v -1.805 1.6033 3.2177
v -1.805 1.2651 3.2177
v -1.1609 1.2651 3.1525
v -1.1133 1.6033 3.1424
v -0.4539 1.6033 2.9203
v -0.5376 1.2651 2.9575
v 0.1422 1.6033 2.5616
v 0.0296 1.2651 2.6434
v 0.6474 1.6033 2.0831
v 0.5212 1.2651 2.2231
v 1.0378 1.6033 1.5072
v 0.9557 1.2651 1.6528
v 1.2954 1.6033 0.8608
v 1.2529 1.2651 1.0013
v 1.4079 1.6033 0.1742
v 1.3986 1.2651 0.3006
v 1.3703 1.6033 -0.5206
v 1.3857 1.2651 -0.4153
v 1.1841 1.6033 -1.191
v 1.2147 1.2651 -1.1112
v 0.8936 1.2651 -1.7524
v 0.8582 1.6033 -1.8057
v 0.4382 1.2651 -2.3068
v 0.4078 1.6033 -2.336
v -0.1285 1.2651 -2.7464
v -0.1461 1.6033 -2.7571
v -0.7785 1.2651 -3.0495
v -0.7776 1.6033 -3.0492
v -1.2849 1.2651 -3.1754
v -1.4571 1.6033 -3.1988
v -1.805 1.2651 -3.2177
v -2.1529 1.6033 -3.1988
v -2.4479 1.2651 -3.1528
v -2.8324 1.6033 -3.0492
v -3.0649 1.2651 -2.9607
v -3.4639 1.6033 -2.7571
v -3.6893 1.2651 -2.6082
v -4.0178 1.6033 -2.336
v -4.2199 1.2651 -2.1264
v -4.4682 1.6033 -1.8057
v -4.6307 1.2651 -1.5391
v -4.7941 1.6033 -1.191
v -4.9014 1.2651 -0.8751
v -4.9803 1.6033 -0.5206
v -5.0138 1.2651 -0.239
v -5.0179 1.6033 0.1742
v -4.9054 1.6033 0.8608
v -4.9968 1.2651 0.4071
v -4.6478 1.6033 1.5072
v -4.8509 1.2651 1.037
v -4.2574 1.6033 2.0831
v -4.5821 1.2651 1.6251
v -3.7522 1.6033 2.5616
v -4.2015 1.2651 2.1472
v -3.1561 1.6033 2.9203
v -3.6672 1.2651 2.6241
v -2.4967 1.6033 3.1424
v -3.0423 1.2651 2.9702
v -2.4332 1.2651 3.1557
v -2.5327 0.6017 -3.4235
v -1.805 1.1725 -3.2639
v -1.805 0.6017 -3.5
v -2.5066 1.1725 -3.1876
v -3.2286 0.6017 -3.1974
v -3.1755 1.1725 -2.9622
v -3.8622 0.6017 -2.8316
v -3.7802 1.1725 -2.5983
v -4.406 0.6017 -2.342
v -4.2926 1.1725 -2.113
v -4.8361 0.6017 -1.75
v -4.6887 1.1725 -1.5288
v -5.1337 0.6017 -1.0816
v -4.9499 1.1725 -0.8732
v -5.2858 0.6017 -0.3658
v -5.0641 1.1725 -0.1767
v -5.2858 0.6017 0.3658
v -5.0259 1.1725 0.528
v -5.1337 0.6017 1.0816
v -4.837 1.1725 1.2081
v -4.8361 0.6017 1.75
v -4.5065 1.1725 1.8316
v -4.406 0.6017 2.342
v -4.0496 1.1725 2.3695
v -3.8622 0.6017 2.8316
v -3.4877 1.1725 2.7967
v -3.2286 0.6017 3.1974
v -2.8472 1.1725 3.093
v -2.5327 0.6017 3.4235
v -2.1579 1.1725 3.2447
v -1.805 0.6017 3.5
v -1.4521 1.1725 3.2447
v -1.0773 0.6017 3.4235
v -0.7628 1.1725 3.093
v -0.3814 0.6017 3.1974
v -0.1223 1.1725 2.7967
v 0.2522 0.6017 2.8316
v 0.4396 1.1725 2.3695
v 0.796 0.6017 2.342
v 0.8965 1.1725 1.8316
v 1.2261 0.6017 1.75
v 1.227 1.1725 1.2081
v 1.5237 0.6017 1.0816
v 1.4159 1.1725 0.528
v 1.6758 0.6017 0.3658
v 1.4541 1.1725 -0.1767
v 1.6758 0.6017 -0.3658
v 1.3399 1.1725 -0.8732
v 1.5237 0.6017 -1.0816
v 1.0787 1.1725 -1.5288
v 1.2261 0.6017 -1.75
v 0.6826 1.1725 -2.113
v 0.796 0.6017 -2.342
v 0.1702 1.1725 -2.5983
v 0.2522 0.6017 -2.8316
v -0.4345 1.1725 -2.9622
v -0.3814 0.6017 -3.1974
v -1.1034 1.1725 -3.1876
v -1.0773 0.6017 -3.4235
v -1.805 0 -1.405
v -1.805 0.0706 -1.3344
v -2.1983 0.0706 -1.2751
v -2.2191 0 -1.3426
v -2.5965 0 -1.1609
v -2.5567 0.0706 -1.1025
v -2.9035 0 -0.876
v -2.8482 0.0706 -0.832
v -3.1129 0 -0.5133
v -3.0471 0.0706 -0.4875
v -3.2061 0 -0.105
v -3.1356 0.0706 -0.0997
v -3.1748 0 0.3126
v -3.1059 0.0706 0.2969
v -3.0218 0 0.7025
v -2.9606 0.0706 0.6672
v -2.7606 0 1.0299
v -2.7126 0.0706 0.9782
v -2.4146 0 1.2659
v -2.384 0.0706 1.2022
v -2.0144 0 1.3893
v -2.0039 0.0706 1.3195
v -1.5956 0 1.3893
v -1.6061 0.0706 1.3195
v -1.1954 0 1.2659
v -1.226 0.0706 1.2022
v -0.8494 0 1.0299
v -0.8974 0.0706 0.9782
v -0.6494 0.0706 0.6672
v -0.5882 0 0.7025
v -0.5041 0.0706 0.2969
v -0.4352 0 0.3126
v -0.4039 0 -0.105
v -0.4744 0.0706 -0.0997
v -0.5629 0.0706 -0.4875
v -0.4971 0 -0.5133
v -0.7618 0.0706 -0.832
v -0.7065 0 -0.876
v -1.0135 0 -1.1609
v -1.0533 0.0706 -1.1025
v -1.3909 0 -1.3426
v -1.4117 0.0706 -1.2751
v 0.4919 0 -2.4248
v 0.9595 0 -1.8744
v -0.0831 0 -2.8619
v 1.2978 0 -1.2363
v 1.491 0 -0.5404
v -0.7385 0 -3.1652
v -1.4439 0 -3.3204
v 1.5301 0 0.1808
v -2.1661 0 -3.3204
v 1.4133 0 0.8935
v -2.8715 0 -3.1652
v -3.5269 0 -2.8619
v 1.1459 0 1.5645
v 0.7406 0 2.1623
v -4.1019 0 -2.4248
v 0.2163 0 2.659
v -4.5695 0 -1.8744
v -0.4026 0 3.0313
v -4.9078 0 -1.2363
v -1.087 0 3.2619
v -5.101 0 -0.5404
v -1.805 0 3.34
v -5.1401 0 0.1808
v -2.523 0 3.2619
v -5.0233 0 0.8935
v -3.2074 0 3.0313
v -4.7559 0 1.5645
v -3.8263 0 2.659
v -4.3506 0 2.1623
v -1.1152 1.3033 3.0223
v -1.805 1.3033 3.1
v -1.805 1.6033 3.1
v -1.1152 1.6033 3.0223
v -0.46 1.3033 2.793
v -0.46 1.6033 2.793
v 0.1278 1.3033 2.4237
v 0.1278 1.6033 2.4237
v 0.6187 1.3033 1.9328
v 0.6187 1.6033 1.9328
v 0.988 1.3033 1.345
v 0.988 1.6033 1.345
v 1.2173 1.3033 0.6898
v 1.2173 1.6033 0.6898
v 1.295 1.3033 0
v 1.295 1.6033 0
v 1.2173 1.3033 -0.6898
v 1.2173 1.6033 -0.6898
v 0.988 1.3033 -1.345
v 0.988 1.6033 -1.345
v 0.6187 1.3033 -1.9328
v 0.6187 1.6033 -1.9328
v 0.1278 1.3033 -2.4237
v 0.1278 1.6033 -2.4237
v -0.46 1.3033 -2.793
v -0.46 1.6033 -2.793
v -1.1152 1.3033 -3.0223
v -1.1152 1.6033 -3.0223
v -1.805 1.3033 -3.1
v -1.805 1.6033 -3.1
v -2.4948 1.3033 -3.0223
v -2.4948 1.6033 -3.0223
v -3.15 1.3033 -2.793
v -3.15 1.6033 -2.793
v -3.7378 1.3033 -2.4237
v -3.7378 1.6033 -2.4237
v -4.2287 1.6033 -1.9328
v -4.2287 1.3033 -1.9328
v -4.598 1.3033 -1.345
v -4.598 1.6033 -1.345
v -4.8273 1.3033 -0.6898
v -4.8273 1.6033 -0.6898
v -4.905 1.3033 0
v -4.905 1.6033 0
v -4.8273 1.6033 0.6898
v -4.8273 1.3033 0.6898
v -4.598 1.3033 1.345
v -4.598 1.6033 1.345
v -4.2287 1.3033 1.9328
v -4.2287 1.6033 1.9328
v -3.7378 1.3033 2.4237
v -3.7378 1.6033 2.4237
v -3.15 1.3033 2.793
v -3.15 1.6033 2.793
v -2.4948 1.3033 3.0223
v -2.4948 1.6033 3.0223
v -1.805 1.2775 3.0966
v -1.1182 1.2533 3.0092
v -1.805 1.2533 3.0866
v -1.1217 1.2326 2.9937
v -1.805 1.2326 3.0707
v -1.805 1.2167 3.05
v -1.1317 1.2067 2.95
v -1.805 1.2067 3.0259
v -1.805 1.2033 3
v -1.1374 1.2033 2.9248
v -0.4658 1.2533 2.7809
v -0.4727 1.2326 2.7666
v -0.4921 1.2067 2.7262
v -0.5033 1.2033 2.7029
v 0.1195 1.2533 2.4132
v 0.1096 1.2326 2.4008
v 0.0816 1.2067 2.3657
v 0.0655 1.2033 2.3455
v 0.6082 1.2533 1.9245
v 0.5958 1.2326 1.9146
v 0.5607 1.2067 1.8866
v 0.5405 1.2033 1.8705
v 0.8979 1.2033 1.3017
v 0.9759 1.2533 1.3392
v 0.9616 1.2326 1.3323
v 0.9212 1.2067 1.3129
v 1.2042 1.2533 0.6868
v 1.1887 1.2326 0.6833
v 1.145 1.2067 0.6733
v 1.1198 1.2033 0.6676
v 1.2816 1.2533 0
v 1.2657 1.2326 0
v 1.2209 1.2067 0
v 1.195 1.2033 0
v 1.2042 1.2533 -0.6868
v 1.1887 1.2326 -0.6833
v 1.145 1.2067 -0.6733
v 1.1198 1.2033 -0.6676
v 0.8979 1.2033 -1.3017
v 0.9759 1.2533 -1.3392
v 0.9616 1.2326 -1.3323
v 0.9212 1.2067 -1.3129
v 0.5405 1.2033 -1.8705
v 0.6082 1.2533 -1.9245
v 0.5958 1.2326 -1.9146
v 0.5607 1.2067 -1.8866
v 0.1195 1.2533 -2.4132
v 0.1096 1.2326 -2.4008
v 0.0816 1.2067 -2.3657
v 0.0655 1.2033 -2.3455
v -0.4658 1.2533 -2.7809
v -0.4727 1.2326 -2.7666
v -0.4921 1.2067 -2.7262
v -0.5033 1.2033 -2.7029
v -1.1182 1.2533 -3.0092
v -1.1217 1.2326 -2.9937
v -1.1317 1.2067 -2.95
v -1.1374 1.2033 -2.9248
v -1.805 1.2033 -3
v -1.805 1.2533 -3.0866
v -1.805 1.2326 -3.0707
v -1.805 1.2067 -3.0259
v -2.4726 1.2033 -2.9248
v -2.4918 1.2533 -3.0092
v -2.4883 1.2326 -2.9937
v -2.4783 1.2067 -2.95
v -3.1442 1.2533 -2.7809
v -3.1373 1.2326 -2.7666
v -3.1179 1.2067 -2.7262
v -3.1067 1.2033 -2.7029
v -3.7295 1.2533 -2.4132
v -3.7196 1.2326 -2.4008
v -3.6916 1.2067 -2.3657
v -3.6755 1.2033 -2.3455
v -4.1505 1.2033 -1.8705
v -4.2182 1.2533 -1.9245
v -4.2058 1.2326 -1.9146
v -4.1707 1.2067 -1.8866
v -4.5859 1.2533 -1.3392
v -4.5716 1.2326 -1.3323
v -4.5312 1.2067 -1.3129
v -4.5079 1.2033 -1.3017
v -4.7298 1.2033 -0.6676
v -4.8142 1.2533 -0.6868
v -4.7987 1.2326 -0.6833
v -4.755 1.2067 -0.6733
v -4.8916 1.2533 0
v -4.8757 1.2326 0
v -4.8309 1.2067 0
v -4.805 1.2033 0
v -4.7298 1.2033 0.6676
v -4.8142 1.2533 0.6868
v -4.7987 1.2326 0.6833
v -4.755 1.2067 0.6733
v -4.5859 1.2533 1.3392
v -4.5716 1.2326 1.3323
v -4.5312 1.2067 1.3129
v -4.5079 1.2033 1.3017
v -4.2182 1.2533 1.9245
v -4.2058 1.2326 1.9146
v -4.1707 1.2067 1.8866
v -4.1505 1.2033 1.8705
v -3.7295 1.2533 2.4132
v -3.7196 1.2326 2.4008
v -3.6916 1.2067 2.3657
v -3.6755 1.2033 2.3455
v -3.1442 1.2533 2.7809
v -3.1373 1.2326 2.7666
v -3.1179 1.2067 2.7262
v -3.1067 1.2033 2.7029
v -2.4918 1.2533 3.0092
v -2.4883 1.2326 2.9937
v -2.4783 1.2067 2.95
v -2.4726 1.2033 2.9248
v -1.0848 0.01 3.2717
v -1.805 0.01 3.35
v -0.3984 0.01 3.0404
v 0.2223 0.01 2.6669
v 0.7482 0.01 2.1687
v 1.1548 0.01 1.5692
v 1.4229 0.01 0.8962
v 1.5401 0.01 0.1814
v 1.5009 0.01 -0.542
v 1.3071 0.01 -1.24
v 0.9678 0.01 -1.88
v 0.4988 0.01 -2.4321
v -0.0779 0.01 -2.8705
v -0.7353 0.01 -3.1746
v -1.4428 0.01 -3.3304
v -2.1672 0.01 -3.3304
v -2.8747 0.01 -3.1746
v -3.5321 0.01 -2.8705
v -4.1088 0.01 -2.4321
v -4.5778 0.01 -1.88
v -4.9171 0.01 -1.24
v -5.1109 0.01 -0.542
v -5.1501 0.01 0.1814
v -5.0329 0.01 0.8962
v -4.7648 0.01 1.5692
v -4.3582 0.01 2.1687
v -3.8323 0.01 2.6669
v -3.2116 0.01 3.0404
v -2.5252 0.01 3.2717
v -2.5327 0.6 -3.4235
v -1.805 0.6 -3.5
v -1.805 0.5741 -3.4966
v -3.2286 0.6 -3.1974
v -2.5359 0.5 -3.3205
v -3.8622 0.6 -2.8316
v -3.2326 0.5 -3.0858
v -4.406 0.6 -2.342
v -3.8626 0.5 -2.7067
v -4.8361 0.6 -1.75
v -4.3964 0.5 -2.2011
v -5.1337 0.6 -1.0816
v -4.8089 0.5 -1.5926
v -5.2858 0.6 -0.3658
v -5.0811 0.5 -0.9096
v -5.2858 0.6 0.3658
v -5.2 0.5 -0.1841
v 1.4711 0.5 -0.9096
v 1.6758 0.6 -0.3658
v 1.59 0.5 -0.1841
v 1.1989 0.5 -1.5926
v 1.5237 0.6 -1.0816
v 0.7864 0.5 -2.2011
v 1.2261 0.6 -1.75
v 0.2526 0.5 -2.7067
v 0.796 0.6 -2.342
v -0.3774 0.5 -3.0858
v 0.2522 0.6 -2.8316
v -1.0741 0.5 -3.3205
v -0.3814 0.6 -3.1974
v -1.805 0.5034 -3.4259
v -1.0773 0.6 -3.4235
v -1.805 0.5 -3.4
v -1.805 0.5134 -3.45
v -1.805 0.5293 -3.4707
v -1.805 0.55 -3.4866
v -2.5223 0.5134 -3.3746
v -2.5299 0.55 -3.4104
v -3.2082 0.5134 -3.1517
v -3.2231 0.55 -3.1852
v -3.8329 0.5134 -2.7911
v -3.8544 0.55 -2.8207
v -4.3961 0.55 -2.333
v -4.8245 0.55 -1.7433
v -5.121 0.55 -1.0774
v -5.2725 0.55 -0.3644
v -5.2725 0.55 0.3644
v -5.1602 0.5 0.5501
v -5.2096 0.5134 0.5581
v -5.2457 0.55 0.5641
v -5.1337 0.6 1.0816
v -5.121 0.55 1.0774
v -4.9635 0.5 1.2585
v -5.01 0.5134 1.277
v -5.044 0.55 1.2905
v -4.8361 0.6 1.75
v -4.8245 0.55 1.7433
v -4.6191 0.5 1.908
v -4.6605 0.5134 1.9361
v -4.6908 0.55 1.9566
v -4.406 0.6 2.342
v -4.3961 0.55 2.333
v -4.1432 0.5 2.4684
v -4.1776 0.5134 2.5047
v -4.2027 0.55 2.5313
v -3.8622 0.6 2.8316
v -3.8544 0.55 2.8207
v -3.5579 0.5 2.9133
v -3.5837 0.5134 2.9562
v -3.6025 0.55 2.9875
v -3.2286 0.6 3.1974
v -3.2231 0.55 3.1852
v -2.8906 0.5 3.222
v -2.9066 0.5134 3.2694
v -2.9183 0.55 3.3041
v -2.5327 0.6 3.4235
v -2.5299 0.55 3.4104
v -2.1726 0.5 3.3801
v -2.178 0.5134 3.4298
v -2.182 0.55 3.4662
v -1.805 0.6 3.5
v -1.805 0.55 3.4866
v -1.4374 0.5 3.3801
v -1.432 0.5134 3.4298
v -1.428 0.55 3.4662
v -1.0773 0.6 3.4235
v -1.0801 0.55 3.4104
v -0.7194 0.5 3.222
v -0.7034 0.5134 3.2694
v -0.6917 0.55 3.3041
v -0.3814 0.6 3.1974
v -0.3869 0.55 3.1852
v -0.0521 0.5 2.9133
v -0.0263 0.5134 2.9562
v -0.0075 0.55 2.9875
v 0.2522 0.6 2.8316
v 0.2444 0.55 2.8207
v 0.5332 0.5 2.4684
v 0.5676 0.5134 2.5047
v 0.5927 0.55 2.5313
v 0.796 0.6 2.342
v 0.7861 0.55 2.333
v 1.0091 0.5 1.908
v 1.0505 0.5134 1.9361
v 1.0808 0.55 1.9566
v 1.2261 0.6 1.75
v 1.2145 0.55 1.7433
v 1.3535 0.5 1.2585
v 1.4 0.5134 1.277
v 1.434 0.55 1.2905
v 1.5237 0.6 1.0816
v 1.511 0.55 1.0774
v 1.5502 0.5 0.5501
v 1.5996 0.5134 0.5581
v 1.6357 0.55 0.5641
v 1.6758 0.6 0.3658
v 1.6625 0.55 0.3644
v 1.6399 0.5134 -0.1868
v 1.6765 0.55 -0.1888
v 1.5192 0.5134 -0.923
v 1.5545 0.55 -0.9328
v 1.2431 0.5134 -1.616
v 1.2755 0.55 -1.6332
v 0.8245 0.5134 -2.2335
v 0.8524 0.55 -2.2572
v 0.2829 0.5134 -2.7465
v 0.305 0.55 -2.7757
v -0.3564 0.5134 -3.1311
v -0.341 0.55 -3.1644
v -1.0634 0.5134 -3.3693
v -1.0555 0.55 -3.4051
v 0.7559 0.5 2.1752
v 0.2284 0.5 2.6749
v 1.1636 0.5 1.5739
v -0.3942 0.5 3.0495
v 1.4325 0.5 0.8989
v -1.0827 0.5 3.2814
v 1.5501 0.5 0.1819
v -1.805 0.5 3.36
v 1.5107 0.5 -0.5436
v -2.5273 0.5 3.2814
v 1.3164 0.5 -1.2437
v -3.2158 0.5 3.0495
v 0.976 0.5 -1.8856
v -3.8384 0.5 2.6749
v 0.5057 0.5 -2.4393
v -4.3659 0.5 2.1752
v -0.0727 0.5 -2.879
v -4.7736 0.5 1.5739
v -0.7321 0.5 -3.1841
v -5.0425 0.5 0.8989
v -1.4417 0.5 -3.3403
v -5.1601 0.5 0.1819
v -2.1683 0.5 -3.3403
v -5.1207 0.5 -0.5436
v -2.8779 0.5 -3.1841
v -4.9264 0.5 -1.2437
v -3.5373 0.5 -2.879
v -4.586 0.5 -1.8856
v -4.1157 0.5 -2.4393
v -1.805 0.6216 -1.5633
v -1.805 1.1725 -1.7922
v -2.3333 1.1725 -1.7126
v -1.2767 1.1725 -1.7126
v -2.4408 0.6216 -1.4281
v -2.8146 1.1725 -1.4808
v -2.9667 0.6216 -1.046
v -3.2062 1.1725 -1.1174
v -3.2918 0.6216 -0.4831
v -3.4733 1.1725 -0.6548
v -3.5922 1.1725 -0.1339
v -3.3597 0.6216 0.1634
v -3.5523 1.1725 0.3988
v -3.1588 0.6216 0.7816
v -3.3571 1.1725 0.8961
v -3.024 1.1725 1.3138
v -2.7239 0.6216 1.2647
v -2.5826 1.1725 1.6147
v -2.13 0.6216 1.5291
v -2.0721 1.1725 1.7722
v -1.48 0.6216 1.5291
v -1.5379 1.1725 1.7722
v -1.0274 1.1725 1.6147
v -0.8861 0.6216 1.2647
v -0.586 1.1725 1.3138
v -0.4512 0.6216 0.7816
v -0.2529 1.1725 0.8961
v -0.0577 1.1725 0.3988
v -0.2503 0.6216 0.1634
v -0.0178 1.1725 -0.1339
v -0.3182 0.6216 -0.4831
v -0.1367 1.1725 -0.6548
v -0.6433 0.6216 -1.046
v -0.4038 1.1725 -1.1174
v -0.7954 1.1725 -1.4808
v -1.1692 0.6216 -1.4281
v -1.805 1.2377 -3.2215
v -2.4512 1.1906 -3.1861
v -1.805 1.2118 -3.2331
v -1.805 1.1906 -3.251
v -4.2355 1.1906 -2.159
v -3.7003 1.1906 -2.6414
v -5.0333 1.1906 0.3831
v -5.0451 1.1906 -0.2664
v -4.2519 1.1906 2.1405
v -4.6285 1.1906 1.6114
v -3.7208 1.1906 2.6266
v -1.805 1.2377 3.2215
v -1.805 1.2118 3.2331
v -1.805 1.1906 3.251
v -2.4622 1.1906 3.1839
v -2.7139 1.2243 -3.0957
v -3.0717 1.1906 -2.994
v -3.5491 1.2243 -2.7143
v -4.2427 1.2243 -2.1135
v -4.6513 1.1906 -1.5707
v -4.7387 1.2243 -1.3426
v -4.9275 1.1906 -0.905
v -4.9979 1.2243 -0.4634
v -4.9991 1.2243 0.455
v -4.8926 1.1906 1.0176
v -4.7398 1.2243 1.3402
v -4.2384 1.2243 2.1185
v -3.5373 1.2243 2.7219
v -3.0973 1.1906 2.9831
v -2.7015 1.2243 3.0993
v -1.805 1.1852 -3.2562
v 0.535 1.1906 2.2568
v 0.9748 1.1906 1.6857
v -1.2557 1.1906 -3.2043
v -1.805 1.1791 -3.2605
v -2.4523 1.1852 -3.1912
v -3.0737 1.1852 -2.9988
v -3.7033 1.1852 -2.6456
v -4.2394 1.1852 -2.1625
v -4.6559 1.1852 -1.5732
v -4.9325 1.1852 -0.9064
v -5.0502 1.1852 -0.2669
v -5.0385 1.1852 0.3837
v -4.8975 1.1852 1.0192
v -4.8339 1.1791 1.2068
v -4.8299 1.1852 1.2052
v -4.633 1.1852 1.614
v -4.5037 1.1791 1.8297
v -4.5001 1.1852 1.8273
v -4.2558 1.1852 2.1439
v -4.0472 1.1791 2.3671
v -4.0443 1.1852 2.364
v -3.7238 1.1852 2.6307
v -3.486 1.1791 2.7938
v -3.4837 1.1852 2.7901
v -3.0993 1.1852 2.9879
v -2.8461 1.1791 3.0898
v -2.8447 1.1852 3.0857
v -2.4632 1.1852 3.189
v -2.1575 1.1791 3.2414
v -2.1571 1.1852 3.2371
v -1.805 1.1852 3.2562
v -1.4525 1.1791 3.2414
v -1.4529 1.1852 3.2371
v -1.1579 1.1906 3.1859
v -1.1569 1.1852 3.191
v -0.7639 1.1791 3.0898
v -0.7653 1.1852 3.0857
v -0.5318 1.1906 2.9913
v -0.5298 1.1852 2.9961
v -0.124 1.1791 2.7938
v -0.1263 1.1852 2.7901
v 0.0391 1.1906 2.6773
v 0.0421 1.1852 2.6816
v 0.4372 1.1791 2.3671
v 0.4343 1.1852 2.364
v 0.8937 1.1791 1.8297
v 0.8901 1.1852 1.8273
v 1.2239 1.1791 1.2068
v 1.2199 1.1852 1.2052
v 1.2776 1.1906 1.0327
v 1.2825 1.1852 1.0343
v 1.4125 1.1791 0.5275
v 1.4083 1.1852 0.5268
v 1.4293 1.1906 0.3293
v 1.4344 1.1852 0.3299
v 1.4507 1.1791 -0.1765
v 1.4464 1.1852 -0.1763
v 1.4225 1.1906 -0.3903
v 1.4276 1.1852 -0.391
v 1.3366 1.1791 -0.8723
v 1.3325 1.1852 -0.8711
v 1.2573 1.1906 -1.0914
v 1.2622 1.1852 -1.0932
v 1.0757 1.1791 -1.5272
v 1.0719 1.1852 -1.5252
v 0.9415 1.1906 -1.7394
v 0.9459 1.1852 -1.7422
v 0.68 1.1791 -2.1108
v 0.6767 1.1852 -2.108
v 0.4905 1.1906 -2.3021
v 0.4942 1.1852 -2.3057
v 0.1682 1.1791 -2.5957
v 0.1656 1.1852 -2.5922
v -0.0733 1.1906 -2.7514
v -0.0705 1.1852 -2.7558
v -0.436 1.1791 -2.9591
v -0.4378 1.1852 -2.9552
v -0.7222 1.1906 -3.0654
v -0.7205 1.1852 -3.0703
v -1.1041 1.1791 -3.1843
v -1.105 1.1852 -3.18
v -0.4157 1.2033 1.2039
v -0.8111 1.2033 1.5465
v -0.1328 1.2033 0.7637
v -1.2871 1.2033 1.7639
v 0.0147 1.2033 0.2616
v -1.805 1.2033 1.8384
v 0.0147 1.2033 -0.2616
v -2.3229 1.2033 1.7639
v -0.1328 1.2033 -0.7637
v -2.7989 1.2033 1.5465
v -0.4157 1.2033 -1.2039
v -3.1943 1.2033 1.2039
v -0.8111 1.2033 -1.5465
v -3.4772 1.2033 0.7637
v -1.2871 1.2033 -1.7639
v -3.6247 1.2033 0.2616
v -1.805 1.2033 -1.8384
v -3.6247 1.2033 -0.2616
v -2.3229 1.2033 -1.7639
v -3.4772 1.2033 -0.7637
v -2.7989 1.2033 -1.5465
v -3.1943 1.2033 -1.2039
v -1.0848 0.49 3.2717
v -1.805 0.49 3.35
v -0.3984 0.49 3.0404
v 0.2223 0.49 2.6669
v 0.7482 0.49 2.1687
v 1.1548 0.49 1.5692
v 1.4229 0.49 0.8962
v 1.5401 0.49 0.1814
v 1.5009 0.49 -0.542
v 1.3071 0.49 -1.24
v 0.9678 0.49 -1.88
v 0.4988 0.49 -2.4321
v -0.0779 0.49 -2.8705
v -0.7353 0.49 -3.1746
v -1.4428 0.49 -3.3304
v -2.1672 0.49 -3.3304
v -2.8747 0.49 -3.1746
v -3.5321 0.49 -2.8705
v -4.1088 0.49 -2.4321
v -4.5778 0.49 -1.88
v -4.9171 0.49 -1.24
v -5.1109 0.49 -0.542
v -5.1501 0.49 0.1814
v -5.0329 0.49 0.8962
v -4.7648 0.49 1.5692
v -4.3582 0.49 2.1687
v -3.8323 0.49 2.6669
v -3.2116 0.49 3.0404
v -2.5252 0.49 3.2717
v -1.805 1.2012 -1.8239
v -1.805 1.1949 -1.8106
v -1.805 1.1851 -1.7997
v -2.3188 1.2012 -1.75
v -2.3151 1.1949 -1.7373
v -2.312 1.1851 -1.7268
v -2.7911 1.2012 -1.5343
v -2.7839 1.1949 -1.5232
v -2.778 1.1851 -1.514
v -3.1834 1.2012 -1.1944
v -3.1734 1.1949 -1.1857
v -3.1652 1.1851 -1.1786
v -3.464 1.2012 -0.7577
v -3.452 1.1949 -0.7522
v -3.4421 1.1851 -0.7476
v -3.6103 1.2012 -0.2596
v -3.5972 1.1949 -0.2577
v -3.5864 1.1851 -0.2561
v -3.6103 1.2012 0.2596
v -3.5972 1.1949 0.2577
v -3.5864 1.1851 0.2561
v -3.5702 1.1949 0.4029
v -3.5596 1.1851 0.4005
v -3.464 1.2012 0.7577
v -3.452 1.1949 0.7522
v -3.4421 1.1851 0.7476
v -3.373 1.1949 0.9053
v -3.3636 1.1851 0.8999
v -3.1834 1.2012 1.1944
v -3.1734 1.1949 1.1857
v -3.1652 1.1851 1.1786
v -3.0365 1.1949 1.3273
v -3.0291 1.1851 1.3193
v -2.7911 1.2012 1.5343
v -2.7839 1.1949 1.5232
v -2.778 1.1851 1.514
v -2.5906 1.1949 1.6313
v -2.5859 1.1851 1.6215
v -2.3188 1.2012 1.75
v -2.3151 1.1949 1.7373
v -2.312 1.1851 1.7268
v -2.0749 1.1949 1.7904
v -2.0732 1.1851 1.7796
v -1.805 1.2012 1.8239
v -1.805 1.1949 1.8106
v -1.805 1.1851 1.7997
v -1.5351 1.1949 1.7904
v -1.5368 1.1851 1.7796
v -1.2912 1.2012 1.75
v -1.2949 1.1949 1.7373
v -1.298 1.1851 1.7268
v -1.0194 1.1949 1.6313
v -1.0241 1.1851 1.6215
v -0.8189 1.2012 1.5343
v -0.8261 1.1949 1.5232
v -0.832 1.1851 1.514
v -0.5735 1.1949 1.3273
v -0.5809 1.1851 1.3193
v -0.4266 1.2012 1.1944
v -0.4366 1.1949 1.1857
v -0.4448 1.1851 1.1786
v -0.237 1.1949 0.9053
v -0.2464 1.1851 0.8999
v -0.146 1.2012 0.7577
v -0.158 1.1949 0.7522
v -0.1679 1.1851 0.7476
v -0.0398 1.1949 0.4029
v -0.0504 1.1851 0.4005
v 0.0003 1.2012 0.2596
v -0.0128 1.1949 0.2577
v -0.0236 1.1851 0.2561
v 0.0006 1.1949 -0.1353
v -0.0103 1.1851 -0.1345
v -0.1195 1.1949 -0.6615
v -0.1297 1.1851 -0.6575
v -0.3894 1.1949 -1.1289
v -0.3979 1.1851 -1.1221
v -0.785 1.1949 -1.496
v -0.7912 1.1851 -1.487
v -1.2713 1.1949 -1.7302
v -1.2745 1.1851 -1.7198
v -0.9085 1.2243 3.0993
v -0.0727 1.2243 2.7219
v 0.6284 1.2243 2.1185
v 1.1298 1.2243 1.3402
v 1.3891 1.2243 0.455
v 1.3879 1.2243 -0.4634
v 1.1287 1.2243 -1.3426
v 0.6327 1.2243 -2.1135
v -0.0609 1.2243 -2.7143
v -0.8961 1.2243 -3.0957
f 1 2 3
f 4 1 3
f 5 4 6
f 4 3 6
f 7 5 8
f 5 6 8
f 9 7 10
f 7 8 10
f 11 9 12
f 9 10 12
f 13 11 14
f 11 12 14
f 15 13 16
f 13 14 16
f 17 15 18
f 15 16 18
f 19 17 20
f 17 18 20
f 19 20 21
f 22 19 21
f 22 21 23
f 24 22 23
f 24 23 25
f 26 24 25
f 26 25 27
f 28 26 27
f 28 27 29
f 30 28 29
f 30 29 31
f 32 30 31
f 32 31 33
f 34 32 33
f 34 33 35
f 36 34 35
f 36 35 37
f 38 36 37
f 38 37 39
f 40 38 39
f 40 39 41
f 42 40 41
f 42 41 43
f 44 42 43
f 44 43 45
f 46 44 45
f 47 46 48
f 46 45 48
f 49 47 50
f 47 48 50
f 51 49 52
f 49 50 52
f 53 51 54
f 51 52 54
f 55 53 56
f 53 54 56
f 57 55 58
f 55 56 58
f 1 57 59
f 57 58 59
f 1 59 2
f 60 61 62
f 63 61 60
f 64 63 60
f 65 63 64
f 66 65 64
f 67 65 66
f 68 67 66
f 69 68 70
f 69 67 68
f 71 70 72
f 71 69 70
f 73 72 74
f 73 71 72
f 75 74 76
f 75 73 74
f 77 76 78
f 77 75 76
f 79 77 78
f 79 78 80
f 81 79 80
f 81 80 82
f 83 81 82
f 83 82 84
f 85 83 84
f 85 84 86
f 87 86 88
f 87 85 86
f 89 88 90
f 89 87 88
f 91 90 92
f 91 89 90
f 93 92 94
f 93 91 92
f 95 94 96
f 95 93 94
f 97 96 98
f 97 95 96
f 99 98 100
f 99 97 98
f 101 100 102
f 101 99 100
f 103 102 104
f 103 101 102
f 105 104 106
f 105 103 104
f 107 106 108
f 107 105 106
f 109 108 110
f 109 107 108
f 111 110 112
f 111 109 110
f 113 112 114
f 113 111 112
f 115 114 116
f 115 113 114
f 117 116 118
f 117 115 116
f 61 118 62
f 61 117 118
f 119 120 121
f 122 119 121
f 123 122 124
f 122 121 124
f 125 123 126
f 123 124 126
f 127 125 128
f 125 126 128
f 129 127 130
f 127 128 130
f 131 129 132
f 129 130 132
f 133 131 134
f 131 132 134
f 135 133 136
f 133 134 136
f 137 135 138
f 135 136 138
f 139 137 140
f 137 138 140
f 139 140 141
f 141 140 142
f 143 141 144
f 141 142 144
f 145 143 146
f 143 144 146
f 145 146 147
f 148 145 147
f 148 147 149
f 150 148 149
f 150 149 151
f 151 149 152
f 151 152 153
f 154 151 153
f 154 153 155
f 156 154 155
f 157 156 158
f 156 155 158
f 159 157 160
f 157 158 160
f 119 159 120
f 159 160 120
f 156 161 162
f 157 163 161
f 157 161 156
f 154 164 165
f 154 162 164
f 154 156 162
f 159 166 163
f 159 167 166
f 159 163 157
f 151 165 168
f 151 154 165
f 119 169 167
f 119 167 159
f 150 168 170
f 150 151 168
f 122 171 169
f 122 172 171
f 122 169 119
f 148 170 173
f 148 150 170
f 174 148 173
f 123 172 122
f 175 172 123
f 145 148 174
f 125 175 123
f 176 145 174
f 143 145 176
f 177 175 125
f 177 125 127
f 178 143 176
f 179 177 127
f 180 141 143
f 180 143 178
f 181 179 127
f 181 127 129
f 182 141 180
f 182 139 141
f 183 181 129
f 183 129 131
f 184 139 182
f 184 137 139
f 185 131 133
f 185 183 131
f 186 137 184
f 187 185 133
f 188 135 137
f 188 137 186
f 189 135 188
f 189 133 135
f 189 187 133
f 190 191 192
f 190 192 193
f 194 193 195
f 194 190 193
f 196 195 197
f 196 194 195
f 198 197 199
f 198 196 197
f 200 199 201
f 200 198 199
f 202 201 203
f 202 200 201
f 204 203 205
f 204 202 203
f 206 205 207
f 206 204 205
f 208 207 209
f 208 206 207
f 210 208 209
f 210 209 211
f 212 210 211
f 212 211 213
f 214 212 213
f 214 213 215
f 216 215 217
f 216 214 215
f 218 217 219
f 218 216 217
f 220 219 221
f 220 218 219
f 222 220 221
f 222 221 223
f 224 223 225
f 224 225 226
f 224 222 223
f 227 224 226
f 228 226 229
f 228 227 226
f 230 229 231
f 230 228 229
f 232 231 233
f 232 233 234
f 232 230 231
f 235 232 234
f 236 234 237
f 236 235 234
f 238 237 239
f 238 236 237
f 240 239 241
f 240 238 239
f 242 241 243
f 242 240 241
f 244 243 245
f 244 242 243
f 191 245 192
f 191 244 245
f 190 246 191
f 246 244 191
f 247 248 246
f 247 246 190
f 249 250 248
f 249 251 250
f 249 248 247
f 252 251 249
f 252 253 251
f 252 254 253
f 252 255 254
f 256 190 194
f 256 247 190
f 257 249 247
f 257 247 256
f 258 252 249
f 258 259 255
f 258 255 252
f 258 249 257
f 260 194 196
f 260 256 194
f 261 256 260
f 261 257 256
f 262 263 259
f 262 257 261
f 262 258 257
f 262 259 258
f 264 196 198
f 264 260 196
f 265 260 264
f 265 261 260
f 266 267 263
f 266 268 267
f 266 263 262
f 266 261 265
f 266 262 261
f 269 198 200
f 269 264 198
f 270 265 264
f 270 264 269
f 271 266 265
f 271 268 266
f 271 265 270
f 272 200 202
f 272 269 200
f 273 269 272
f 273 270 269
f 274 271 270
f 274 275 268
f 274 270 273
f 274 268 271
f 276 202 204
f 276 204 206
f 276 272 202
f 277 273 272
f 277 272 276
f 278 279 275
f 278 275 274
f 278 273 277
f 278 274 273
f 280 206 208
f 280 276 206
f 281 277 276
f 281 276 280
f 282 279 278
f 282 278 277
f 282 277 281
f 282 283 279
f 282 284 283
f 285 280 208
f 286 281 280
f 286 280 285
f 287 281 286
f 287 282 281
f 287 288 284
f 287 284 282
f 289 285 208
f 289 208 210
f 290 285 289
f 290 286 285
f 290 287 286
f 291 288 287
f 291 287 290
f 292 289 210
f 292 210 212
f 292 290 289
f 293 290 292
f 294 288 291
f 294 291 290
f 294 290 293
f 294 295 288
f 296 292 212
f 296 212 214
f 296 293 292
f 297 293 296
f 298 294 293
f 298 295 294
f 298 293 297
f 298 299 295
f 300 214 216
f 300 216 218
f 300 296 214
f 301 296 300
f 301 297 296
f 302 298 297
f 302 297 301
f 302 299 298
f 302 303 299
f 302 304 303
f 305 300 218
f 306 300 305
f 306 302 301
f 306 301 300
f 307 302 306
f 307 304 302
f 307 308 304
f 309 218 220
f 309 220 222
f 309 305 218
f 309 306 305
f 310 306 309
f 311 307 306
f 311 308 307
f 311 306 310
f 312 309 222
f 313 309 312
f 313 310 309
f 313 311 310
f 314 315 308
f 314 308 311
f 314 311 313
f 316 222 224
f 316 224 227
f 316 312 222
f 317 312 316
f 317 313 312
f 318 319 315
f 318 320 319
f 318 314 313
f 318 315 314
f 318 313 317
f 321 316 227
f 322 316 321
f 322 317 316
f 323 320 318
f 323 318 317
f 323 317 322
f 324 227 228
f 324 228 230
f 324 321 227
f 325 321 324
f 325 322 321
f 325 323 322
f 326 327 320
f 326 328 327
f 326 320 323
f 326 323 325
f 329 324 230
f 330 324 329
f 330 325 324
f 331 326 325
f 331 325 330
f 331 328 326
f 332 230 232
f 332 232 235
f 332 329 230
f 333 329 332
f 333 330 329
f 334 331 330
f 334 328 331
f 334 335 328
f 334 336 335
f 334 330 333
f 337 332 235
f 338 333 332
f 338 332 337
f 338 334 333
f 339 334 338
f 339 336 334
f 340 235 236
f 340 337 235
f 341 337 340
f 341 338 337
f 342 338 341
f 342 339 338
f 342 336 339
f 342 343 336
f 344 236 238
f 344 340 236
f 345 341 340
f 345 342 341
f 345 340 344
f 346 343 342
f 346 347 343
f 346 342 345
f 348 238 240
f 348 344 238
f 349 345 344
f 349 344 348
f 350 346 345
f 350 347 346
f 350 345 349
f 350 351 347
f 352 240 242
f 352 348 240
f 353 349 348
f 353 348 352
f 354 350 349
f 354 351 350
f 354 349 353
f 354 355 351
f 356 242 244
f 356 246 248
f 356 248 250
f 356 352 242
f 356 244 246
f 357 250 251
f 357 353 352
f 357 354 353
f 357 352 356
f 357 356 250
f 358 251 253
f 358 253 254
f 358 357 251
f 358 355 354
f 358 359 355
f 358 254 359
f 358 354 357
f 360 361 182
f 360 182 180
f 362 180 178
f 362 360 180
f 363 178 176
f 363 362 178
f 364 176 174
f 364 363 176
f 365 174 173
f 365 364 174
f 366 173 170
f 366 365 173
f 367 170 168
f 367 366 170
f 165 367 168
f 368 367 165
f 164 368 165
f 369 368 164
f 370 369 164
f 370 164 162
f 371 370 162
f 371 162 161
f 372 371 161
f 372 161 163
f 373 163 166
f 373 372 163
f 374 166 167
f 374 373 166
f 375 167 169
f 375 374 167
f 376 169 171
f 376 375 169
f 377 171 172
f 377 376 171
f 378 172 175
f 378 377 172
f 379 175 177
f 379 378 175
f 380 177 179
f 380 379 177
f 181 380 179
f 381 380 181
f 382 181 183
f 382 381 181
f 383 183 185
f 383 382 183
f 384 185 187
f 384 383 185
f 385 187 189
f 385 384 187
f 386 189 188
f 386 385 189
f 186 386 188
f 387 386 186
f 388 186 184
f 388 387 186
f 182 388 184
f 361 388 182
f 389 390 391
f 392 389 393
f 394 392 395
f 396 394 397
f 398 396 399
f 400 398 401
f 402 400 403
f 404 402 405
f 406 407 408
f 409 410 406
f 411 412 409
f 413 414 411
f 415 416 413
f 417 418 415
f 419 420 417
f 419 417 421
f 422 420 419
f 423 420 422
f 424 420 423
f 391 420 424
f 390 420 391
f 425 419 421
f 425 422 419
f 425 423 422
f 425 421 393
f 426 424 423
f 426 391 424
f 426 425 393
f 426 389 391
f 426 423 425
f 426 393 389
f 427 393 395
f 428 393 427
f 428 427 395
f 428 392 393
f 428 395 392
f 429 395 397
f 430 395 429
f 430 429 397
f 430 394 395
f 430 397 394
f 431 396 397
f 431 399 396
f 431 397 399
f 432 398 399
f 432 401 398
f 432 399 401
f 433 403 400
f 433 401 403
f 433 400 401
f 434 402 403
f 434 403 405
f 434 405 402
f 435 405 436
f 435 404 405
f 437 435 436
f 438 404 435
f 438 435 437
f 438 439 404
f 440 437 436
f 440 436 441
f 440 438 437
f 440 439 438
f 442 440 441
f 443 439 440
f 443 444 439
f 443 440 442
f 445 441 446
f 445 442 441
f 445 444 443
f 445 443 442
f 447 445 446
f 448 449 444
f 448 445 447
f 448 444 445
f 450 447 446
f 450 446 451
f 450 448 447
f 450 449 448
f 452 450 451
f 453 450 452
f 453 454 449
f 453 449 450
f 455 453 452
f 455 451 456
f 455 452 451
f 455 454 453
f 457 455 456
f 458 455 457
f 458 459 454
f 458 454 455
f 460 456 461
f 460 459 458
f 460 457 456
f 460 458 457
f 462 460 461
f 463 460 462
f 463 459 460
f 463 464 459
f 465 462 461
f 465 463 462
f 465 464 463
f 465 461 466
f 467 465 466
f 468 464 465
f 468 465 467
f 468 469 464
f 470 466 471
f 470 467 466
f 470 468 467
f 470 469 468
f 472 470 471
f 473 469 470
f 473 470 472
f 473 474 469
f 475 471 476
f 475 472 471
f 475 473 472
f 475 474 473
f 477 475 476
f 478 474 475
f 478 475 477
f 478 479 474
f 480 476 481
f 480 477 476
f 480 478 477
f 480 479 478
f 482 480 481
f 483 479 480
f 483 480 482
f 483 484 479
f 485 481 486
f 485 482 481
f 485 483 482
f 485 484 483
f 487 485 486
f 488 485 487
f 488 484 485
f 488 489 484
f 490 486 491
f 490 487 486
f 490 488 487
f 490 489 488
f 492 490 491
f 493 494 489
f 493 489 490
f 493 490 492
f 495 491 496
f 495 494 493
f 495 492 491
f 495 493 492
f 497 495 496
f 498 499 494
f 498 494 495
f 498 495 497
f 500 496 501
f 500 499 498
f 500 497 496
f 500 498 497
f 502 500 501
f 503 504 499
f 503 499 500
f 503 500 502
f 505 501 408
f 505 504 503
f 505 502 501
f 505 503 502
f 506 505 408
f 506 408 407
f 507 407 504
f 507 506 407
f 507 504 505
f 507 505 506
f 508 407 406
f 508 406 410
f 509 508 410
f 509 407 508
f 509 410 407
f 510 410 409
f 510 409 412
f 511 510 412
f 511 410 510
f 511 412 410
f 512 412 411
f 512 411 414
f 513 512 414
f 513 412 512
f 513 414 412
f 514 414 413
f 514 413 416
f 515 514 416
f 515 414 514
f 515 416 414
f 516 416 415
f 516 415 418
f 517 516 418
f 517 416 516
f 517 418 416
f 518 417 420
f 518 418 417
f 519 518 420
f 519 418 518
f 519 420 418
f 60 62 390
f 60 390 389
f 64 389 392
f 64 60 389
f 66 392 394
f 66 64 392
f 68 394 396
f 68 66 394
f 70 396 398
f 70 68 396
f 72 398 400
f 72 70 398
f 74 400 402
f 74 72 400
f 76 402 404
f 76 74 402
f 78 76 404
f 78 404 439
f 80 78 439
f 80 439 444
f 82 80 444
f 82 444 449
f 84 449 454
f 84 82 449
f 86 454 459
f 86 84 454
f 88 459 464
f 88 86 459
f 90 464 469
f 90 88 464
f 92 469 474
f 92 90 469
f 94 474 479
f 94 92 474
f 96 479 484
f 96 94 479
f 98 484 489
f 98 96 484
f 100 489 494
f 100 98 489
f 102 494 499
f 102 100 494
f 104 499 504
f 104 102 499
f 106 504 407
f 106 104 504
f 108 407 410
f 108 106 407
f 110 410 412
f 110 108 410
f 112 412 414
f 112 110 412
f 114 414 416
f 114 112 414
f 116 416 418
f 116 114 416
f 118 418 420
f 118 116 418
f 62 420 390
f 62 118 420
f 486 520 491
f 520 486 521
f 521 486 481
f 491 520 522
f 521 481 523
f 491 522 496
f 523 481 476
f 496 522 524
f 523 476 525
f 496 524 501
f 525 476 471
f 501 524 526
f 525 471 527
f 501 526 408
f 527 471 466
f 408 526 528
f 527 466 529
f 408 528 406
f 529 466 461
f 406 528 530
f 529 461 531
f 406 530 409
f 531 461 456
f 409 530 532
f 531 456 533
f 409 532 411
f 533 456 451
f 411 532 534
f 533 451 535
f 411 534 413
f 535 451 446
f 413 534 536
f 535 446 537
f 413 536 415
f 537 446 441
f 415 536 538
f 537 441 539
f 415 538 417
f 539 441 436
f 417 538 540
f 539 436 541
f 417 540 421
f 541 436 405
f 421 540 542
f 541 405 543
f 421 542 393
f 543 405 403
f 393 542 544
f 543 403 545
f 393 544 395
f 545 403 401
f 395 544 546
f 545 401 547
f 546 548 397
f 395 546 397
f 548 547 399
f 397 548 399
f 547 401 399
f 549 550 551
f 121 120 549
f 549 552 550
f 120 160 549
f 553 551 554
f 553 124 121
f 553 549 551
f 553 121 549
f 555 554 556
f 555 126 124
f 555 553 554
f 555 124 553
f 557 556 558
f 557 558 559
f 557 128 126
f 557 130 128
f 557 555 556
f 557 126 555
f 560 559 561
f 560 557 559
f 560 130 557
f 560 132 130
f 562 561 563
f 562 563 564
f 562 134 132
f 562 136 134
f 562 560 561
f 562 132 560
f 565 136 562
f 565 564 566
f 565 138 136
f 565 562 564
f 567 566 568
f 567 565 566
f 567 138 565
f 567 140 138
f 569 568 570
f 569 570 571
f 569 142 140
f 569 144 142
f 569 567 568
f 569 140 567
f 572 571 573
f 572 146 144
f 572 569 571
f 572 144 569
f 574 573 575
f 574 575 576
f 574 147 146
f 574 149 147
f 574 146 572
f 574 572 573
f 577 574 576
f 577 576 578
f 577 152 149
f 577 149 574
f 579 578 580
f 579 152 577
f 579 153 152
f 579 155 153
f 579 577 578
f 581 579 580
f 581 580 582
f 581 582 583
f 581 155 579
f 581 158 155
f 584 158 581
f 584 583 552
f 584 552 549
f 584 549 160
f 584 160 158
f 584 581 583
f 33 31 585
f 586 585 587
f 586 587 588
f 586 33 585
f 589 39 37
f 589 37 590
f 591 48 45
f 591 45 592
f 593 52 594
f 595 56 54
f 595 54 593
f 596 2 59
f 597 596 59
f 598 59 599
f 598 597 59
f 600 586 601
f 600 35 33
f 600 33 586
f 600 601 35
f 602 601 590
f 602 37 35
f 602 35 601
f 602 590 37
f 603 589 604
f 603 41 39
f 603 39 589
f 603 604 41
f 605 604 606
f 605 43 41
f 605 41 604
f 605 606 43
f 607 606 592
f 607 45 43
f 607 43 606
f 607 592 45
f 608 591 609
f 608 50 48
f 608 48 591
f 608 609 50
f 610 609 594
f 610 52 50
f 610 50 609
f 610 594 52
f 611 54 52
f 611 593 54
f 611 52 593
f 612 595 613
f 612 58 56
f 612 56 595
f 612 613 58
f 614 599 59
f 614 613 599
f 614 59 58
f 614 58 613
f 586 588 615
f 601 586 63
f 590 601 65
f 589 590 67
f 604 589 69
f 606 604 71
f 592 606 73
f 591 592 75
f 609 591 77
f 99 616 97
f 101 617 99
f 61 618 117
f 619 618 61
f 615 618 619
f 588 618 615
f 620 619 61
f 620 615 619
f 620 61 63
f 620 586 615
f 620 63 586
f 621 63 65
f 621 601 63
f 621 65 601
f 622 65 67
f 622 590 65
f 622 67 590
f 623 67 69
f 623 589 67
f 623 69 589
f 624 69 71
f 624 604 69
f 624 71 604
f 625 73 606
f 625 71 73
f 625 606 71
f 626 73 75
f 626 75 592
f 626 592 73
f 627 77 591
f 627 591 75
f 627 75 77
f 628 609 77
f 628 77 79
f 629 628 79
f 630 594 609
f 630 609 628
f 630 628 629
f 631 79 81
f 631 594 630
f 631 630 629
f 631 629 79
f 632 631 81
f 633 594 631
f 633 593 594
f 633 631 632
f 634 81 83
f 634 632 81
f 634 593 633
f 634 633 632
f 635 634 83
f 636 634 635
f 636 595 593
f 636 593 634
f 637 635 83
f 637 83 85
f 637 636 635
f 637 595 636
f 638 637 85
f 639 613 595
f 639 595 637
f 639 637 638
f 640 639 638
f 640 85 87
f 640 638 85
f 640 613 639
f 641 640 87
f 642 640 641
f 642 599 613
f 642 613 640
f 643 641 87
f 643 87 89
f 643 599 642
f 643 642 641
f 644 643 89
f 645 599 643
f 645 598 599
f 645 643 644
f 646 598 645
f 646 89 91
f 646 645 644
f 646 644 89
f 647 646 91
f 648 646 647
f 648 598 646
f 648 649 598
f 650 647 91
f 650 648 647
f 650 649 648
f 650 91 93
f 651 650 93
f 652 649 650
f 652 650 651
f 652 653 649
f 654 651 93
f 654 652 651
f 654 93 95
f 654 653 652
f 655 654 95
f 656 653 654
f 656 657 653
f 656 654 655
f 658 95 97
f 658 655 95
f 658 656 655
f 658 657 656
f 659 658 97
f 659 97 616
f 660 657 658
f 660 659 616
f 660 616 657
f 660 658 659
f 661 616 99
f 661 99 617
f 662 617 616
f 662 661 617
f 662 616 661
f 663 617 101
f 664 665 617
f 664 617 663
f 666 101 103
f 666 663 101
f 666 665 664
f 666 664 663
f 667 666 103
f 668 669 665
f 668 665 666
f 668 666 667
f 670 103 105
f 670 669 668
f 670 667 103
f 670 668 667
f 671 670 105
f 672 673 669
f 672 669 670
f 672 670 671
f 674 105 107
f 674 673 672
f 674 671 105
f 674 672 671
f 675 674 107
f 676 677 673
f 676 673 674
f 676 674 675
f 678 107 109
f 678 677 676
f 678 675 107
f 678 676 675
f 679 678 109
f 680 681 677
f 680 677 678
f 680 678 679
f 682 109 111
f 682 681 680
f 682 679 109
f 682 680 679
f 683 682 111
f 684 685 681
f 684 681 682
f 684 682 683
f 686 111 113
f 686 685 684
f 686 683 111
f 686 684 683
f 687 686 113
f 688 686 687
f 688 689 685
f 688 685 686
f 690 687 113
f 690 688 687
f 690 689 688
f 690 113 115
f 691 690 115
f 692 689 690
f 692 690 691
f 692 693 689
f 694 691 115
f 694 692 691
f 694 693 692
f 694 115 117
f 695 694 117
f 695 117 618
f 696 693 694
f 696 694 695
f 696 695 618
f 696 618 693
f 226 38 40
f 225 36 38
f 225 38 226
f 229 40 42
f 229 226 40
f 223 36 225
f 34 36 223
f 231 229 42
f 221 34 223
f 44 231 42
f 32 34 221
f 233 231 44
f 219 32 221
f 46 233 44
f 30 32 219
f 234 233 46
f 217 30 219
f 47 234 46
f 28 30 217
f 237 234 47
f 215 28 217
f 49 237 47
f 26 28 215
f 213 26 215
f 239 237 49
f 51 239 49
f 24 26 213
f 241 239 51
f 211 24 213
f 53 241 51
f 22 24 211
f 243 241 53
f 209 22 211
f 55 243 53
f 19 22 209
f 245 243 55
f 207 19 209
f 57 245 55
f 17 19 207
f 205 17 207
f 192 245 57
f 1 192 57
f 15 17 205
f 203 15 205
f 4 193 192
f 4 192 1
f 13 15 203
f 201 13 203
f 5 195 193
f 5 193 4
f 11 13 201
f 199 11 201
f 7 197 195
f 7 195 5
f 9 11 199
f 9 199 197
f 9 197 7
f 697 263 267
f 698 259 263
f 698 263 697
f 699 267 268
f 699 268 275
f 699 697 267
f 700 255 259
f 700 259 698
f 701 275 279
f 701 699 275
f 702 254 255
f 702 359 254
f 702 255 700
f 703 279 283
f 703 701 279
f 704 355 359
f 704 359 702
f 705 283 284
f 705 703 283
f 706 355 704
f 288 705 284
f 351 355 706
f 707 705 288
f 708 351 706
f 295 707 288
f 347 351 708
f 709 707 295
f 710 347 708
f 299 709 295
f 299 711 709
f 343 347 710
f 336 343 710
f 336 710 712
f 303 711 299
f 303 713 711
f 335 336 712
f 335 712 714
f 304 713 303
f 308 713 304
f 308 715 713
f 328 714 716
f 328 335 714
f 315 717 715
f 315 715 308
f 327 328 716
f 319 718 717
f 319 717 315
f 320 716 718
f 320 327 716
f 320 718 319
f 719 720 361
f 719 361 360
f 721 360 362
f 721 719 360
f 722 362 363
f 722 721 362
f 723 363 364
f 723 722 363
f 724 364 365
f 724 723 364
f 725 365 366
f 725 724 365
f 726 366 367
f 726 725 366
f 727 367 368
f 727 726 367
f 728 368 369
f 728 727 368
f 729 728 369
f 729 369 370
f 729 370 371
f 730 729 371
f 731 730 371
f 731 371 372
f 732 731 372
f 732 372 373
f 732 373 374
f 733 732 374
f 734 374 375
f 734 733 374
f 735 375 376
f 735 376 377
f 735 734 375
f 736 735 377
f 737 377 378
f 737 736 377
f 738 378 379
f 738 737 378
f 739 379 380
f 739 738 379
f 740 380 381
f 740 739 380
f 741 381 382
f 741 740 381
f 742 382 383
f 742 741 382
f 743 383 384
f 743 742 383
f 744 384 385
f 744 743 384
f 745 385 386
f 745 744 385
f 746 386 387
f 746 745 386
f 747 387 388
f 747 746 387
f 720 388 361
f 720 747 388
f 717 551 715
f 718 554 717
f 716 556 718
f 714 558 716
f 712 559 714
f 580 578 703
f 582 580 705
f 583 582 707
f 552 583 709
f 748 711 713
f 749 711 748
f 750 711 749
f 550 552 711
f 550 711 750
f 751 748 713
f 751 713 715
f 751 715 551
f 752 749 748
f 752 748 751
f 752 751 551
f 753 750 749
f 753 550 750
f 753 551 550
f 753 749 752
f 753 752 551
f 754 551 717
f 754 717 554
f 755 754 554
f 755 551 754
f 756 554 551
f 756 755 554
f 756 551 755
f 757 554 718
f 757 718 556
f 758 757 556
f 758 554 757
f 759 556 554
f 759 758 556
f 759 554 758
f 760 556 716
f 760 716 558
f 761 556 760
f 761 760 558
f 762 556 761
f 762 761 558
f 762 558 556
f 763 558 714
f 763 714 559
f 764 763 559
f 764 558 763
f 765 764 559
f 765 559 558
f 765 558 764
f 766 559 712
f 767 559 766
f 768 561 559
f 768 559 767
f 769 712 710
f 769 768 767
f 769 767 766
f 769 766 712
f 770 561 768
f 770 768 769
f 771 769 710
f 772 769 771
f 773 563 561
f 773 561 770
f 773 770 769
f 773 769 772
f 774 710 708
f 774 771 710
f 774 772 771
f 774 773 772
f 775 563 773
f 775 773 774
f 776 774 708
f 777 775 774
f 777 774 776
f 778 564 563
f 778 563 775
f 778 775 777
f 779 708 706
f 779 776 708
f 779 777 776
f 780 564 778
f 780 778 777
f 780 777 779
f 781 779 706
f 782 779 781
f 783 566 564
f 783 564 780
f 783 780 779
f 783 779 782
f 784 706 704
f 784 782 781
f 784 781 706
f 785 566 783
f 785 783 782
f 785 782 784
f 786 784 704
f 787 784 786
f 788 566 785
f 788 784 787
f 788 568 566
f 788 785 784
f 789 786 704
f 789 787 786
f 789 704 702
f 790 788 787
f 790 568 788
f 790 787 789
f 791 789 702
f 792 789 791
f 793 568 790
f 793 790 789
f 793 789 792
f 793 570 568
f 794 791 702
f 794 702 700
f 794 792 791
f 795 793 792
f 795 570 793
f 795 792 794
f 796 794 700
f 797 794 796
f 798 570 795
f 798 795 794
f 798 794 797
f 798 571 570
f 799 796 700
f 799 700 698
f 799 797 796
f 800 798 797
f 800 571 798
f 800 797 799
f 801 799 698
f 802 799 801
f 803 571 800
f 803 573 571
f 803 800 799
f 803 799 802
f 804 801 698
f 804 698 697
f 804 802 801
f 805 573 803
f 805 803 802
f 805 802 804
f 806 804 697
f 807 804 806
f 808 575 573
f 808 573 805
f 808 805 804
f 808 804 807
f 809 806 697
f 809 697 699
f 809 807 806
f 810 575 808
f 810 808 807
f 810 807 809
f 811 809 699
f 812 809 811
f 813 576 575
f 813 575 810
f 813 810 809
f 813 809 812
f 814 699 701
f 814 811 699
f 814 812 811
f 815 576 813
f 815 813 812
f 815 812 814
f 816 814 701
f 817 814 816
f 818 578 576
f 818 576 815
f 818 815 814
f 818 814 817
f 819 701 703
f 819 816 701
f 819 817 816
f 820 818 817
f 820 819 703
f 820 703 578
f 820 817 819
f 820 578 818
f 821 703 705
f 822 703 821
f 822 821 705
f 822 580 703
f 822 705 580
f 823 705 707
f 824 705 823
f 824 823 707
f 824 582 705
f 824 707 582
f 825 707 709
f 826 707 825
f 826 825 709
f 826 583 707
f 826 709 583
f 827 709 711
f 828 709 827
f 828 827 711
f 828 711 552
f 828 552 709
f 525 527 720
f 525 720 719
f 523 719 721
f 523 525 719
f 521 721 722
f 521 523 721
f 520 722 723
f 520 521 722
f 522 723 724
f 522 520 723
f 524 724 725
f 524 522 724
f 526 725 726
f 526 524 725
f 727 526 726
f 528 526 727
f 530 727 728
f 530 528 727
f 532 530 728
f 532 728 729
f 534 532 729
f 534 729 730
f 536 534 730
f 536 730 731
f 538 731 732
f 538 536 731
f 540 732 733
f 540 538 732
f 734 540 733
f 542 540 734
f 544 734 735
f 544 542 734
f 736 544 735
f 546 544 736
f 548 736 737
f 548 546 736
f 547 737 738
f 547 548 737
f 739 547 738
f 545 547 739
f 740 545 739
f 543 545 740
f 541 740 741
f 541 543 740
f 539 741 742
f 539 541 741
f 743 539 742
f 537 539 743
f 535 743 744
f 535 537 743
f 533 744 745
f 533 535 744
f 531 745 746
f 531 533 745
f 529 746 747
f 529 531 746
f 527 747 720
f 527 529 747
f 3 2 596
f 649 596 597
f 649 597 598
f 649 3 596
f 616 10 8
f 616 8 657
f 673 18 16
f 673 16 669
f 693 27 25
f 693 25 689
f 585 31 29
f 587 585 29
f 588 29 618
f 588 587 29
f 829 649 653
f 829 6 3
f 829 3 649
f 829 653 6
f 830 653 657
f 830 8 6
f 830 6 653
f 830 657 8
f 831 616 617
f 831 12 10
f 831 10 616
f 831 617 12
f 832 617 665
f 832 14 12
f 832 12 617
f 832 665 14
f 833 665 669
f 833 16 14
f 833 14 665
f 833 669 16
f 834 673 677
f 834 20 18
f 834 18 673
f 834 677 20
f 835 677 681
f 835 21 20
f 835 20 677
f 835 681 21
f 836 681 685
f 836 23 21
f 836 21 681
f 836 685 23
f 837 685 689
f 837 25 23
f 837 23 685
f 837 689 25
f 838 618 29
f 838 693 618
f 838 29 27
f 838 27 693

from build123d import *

# Parameters (mm, degrees)
FILLET_2_R          = 0.05
SKETCH_6_R          = 3.217657182
SKETCH_6_R_2        = 3.1
EXTRUDE_1_DEPTH     = 0.4
FILLET_4_R          = 0.1
CHAMFER_1_SIZE      = 0.1
CHAMFER_1_SIZE2     = 0.076501692
SKETCH_7_R          = 3.5
SKETCH_7_R_2        = 3.35
CUT_EXTRUDE_3_DEPTH = 0.5
CHAMFER_2_SIZE      = 0.01
FILLET_6_R          = 0.1


with BuildPart() as part:
    # 草图2 → 旋转1 (revolve)
    with BuildSketch(Plane.XY, mode=Mode.PRIVATE) as revolve_1_sk:
        Polygon((-0.5, 0), (0, 0), (1.695, 0), (1.695, 0.601670643), (1.446081598, 1.203341286), (0, 1.203341286), align=None)
    revolve(revolve_1_sk.sketch.rotate(Axis((-1.805, 0, 0), (0, 1, 0)), 90), axis=Axis((-1.805, 0, 0), (0, 1, 0)))

    # 圆角2
    fillet_2_edges = [part.edges().sort_by_distance(p)[0] for p in [
        (-1.805, 1.203341286, 1.805),
        (-1.805, 1.203341286, 3.251081598),
    ]]
    fillet(fillet_2_edges, radius=FILLET_2_R)

    # 草图6 → 凸台-拉伸1 (add)
    with BuildSketch(Plane(origin=(0, 1.203341286, 0), x_dir=(1, 0, 0), z_dir=(0, 1, 0))):
        with Locations(Location((-1.805, 0, 0), (0, 0, 270))):
            Circle(SKETCH_6_R)
        with Locations(Location((-1.805, 0, 0), (0, 0, 270))):
            Circle(SKETCH_6_R_2, mode=Mode.SUBTRACT)
    extrude(amount=EXTRUDE_1_DEPTH)

    # 圆角4
    fillet_4_edges = [part.edges().sort_by_distance(p)[0] for p in [
        (-5.022657182, 1.203341286, 0),
        (-1.805, 1.203341286, -3.1),
    ]]
    fillet(fillet_4_edges, radius=FILLET_4_R)

    # 倒角1
    chamfer_1_edges = [part.edges().sort_by_distance(p)[0] for p in [
        (-1.805, 0, 1.305),
    ]]
    chamfer_1_side = [part.faces().sort_by_distance(p)[0] for p in [
        (-1.805, 0, 1.403994949),
    ]]
    chamfer(chamfer_1_edges, length=CHAMFER_1_SIZE, length2=CHAMFER_1_SIZE2, reference=chamfer_1_side[0])

    # 草图7 → 切除-拉伸3 (cut)
    with BuildSketch(Plane(origin=(0, 0.5, 0), x_dir=(1, 0, 0), z_dir=(0, 1, 0))):
        with Locations(Location((-1.805, 0, 0), (0, 0, 90))):
            Circle(SKETCH_7_R)
        with Locations(Location((-1.805, 0, 0), (0, 0, 270))):
            Circle(SKETCH_7_R_2, mode=Mode.SUBTRACT)
    extrude(amount=-CUT_EXTRUDE_3_DEPTH, mode=Mode.SUBTRACT)

    # 倒角2
    chamfer_2_edges = [part.edges().sort_by_distance(p)[0] for p in [
        (-1.805, 0, -3.35),
        (-1.805, 0.5, -3.35),
    ]]
    chamfer(chamfer_2_edges, length=CHAMFER_2_SIZE)

    # 圆角6
    fillet_6_edges = [part.edges().sort_by_distance(p)[0] for p in [
        (-1.805, 0.5, 3.5),
    ]]
    fillet(fillet_6_edges, radius=FILLET_6_R)


solid = part.part
